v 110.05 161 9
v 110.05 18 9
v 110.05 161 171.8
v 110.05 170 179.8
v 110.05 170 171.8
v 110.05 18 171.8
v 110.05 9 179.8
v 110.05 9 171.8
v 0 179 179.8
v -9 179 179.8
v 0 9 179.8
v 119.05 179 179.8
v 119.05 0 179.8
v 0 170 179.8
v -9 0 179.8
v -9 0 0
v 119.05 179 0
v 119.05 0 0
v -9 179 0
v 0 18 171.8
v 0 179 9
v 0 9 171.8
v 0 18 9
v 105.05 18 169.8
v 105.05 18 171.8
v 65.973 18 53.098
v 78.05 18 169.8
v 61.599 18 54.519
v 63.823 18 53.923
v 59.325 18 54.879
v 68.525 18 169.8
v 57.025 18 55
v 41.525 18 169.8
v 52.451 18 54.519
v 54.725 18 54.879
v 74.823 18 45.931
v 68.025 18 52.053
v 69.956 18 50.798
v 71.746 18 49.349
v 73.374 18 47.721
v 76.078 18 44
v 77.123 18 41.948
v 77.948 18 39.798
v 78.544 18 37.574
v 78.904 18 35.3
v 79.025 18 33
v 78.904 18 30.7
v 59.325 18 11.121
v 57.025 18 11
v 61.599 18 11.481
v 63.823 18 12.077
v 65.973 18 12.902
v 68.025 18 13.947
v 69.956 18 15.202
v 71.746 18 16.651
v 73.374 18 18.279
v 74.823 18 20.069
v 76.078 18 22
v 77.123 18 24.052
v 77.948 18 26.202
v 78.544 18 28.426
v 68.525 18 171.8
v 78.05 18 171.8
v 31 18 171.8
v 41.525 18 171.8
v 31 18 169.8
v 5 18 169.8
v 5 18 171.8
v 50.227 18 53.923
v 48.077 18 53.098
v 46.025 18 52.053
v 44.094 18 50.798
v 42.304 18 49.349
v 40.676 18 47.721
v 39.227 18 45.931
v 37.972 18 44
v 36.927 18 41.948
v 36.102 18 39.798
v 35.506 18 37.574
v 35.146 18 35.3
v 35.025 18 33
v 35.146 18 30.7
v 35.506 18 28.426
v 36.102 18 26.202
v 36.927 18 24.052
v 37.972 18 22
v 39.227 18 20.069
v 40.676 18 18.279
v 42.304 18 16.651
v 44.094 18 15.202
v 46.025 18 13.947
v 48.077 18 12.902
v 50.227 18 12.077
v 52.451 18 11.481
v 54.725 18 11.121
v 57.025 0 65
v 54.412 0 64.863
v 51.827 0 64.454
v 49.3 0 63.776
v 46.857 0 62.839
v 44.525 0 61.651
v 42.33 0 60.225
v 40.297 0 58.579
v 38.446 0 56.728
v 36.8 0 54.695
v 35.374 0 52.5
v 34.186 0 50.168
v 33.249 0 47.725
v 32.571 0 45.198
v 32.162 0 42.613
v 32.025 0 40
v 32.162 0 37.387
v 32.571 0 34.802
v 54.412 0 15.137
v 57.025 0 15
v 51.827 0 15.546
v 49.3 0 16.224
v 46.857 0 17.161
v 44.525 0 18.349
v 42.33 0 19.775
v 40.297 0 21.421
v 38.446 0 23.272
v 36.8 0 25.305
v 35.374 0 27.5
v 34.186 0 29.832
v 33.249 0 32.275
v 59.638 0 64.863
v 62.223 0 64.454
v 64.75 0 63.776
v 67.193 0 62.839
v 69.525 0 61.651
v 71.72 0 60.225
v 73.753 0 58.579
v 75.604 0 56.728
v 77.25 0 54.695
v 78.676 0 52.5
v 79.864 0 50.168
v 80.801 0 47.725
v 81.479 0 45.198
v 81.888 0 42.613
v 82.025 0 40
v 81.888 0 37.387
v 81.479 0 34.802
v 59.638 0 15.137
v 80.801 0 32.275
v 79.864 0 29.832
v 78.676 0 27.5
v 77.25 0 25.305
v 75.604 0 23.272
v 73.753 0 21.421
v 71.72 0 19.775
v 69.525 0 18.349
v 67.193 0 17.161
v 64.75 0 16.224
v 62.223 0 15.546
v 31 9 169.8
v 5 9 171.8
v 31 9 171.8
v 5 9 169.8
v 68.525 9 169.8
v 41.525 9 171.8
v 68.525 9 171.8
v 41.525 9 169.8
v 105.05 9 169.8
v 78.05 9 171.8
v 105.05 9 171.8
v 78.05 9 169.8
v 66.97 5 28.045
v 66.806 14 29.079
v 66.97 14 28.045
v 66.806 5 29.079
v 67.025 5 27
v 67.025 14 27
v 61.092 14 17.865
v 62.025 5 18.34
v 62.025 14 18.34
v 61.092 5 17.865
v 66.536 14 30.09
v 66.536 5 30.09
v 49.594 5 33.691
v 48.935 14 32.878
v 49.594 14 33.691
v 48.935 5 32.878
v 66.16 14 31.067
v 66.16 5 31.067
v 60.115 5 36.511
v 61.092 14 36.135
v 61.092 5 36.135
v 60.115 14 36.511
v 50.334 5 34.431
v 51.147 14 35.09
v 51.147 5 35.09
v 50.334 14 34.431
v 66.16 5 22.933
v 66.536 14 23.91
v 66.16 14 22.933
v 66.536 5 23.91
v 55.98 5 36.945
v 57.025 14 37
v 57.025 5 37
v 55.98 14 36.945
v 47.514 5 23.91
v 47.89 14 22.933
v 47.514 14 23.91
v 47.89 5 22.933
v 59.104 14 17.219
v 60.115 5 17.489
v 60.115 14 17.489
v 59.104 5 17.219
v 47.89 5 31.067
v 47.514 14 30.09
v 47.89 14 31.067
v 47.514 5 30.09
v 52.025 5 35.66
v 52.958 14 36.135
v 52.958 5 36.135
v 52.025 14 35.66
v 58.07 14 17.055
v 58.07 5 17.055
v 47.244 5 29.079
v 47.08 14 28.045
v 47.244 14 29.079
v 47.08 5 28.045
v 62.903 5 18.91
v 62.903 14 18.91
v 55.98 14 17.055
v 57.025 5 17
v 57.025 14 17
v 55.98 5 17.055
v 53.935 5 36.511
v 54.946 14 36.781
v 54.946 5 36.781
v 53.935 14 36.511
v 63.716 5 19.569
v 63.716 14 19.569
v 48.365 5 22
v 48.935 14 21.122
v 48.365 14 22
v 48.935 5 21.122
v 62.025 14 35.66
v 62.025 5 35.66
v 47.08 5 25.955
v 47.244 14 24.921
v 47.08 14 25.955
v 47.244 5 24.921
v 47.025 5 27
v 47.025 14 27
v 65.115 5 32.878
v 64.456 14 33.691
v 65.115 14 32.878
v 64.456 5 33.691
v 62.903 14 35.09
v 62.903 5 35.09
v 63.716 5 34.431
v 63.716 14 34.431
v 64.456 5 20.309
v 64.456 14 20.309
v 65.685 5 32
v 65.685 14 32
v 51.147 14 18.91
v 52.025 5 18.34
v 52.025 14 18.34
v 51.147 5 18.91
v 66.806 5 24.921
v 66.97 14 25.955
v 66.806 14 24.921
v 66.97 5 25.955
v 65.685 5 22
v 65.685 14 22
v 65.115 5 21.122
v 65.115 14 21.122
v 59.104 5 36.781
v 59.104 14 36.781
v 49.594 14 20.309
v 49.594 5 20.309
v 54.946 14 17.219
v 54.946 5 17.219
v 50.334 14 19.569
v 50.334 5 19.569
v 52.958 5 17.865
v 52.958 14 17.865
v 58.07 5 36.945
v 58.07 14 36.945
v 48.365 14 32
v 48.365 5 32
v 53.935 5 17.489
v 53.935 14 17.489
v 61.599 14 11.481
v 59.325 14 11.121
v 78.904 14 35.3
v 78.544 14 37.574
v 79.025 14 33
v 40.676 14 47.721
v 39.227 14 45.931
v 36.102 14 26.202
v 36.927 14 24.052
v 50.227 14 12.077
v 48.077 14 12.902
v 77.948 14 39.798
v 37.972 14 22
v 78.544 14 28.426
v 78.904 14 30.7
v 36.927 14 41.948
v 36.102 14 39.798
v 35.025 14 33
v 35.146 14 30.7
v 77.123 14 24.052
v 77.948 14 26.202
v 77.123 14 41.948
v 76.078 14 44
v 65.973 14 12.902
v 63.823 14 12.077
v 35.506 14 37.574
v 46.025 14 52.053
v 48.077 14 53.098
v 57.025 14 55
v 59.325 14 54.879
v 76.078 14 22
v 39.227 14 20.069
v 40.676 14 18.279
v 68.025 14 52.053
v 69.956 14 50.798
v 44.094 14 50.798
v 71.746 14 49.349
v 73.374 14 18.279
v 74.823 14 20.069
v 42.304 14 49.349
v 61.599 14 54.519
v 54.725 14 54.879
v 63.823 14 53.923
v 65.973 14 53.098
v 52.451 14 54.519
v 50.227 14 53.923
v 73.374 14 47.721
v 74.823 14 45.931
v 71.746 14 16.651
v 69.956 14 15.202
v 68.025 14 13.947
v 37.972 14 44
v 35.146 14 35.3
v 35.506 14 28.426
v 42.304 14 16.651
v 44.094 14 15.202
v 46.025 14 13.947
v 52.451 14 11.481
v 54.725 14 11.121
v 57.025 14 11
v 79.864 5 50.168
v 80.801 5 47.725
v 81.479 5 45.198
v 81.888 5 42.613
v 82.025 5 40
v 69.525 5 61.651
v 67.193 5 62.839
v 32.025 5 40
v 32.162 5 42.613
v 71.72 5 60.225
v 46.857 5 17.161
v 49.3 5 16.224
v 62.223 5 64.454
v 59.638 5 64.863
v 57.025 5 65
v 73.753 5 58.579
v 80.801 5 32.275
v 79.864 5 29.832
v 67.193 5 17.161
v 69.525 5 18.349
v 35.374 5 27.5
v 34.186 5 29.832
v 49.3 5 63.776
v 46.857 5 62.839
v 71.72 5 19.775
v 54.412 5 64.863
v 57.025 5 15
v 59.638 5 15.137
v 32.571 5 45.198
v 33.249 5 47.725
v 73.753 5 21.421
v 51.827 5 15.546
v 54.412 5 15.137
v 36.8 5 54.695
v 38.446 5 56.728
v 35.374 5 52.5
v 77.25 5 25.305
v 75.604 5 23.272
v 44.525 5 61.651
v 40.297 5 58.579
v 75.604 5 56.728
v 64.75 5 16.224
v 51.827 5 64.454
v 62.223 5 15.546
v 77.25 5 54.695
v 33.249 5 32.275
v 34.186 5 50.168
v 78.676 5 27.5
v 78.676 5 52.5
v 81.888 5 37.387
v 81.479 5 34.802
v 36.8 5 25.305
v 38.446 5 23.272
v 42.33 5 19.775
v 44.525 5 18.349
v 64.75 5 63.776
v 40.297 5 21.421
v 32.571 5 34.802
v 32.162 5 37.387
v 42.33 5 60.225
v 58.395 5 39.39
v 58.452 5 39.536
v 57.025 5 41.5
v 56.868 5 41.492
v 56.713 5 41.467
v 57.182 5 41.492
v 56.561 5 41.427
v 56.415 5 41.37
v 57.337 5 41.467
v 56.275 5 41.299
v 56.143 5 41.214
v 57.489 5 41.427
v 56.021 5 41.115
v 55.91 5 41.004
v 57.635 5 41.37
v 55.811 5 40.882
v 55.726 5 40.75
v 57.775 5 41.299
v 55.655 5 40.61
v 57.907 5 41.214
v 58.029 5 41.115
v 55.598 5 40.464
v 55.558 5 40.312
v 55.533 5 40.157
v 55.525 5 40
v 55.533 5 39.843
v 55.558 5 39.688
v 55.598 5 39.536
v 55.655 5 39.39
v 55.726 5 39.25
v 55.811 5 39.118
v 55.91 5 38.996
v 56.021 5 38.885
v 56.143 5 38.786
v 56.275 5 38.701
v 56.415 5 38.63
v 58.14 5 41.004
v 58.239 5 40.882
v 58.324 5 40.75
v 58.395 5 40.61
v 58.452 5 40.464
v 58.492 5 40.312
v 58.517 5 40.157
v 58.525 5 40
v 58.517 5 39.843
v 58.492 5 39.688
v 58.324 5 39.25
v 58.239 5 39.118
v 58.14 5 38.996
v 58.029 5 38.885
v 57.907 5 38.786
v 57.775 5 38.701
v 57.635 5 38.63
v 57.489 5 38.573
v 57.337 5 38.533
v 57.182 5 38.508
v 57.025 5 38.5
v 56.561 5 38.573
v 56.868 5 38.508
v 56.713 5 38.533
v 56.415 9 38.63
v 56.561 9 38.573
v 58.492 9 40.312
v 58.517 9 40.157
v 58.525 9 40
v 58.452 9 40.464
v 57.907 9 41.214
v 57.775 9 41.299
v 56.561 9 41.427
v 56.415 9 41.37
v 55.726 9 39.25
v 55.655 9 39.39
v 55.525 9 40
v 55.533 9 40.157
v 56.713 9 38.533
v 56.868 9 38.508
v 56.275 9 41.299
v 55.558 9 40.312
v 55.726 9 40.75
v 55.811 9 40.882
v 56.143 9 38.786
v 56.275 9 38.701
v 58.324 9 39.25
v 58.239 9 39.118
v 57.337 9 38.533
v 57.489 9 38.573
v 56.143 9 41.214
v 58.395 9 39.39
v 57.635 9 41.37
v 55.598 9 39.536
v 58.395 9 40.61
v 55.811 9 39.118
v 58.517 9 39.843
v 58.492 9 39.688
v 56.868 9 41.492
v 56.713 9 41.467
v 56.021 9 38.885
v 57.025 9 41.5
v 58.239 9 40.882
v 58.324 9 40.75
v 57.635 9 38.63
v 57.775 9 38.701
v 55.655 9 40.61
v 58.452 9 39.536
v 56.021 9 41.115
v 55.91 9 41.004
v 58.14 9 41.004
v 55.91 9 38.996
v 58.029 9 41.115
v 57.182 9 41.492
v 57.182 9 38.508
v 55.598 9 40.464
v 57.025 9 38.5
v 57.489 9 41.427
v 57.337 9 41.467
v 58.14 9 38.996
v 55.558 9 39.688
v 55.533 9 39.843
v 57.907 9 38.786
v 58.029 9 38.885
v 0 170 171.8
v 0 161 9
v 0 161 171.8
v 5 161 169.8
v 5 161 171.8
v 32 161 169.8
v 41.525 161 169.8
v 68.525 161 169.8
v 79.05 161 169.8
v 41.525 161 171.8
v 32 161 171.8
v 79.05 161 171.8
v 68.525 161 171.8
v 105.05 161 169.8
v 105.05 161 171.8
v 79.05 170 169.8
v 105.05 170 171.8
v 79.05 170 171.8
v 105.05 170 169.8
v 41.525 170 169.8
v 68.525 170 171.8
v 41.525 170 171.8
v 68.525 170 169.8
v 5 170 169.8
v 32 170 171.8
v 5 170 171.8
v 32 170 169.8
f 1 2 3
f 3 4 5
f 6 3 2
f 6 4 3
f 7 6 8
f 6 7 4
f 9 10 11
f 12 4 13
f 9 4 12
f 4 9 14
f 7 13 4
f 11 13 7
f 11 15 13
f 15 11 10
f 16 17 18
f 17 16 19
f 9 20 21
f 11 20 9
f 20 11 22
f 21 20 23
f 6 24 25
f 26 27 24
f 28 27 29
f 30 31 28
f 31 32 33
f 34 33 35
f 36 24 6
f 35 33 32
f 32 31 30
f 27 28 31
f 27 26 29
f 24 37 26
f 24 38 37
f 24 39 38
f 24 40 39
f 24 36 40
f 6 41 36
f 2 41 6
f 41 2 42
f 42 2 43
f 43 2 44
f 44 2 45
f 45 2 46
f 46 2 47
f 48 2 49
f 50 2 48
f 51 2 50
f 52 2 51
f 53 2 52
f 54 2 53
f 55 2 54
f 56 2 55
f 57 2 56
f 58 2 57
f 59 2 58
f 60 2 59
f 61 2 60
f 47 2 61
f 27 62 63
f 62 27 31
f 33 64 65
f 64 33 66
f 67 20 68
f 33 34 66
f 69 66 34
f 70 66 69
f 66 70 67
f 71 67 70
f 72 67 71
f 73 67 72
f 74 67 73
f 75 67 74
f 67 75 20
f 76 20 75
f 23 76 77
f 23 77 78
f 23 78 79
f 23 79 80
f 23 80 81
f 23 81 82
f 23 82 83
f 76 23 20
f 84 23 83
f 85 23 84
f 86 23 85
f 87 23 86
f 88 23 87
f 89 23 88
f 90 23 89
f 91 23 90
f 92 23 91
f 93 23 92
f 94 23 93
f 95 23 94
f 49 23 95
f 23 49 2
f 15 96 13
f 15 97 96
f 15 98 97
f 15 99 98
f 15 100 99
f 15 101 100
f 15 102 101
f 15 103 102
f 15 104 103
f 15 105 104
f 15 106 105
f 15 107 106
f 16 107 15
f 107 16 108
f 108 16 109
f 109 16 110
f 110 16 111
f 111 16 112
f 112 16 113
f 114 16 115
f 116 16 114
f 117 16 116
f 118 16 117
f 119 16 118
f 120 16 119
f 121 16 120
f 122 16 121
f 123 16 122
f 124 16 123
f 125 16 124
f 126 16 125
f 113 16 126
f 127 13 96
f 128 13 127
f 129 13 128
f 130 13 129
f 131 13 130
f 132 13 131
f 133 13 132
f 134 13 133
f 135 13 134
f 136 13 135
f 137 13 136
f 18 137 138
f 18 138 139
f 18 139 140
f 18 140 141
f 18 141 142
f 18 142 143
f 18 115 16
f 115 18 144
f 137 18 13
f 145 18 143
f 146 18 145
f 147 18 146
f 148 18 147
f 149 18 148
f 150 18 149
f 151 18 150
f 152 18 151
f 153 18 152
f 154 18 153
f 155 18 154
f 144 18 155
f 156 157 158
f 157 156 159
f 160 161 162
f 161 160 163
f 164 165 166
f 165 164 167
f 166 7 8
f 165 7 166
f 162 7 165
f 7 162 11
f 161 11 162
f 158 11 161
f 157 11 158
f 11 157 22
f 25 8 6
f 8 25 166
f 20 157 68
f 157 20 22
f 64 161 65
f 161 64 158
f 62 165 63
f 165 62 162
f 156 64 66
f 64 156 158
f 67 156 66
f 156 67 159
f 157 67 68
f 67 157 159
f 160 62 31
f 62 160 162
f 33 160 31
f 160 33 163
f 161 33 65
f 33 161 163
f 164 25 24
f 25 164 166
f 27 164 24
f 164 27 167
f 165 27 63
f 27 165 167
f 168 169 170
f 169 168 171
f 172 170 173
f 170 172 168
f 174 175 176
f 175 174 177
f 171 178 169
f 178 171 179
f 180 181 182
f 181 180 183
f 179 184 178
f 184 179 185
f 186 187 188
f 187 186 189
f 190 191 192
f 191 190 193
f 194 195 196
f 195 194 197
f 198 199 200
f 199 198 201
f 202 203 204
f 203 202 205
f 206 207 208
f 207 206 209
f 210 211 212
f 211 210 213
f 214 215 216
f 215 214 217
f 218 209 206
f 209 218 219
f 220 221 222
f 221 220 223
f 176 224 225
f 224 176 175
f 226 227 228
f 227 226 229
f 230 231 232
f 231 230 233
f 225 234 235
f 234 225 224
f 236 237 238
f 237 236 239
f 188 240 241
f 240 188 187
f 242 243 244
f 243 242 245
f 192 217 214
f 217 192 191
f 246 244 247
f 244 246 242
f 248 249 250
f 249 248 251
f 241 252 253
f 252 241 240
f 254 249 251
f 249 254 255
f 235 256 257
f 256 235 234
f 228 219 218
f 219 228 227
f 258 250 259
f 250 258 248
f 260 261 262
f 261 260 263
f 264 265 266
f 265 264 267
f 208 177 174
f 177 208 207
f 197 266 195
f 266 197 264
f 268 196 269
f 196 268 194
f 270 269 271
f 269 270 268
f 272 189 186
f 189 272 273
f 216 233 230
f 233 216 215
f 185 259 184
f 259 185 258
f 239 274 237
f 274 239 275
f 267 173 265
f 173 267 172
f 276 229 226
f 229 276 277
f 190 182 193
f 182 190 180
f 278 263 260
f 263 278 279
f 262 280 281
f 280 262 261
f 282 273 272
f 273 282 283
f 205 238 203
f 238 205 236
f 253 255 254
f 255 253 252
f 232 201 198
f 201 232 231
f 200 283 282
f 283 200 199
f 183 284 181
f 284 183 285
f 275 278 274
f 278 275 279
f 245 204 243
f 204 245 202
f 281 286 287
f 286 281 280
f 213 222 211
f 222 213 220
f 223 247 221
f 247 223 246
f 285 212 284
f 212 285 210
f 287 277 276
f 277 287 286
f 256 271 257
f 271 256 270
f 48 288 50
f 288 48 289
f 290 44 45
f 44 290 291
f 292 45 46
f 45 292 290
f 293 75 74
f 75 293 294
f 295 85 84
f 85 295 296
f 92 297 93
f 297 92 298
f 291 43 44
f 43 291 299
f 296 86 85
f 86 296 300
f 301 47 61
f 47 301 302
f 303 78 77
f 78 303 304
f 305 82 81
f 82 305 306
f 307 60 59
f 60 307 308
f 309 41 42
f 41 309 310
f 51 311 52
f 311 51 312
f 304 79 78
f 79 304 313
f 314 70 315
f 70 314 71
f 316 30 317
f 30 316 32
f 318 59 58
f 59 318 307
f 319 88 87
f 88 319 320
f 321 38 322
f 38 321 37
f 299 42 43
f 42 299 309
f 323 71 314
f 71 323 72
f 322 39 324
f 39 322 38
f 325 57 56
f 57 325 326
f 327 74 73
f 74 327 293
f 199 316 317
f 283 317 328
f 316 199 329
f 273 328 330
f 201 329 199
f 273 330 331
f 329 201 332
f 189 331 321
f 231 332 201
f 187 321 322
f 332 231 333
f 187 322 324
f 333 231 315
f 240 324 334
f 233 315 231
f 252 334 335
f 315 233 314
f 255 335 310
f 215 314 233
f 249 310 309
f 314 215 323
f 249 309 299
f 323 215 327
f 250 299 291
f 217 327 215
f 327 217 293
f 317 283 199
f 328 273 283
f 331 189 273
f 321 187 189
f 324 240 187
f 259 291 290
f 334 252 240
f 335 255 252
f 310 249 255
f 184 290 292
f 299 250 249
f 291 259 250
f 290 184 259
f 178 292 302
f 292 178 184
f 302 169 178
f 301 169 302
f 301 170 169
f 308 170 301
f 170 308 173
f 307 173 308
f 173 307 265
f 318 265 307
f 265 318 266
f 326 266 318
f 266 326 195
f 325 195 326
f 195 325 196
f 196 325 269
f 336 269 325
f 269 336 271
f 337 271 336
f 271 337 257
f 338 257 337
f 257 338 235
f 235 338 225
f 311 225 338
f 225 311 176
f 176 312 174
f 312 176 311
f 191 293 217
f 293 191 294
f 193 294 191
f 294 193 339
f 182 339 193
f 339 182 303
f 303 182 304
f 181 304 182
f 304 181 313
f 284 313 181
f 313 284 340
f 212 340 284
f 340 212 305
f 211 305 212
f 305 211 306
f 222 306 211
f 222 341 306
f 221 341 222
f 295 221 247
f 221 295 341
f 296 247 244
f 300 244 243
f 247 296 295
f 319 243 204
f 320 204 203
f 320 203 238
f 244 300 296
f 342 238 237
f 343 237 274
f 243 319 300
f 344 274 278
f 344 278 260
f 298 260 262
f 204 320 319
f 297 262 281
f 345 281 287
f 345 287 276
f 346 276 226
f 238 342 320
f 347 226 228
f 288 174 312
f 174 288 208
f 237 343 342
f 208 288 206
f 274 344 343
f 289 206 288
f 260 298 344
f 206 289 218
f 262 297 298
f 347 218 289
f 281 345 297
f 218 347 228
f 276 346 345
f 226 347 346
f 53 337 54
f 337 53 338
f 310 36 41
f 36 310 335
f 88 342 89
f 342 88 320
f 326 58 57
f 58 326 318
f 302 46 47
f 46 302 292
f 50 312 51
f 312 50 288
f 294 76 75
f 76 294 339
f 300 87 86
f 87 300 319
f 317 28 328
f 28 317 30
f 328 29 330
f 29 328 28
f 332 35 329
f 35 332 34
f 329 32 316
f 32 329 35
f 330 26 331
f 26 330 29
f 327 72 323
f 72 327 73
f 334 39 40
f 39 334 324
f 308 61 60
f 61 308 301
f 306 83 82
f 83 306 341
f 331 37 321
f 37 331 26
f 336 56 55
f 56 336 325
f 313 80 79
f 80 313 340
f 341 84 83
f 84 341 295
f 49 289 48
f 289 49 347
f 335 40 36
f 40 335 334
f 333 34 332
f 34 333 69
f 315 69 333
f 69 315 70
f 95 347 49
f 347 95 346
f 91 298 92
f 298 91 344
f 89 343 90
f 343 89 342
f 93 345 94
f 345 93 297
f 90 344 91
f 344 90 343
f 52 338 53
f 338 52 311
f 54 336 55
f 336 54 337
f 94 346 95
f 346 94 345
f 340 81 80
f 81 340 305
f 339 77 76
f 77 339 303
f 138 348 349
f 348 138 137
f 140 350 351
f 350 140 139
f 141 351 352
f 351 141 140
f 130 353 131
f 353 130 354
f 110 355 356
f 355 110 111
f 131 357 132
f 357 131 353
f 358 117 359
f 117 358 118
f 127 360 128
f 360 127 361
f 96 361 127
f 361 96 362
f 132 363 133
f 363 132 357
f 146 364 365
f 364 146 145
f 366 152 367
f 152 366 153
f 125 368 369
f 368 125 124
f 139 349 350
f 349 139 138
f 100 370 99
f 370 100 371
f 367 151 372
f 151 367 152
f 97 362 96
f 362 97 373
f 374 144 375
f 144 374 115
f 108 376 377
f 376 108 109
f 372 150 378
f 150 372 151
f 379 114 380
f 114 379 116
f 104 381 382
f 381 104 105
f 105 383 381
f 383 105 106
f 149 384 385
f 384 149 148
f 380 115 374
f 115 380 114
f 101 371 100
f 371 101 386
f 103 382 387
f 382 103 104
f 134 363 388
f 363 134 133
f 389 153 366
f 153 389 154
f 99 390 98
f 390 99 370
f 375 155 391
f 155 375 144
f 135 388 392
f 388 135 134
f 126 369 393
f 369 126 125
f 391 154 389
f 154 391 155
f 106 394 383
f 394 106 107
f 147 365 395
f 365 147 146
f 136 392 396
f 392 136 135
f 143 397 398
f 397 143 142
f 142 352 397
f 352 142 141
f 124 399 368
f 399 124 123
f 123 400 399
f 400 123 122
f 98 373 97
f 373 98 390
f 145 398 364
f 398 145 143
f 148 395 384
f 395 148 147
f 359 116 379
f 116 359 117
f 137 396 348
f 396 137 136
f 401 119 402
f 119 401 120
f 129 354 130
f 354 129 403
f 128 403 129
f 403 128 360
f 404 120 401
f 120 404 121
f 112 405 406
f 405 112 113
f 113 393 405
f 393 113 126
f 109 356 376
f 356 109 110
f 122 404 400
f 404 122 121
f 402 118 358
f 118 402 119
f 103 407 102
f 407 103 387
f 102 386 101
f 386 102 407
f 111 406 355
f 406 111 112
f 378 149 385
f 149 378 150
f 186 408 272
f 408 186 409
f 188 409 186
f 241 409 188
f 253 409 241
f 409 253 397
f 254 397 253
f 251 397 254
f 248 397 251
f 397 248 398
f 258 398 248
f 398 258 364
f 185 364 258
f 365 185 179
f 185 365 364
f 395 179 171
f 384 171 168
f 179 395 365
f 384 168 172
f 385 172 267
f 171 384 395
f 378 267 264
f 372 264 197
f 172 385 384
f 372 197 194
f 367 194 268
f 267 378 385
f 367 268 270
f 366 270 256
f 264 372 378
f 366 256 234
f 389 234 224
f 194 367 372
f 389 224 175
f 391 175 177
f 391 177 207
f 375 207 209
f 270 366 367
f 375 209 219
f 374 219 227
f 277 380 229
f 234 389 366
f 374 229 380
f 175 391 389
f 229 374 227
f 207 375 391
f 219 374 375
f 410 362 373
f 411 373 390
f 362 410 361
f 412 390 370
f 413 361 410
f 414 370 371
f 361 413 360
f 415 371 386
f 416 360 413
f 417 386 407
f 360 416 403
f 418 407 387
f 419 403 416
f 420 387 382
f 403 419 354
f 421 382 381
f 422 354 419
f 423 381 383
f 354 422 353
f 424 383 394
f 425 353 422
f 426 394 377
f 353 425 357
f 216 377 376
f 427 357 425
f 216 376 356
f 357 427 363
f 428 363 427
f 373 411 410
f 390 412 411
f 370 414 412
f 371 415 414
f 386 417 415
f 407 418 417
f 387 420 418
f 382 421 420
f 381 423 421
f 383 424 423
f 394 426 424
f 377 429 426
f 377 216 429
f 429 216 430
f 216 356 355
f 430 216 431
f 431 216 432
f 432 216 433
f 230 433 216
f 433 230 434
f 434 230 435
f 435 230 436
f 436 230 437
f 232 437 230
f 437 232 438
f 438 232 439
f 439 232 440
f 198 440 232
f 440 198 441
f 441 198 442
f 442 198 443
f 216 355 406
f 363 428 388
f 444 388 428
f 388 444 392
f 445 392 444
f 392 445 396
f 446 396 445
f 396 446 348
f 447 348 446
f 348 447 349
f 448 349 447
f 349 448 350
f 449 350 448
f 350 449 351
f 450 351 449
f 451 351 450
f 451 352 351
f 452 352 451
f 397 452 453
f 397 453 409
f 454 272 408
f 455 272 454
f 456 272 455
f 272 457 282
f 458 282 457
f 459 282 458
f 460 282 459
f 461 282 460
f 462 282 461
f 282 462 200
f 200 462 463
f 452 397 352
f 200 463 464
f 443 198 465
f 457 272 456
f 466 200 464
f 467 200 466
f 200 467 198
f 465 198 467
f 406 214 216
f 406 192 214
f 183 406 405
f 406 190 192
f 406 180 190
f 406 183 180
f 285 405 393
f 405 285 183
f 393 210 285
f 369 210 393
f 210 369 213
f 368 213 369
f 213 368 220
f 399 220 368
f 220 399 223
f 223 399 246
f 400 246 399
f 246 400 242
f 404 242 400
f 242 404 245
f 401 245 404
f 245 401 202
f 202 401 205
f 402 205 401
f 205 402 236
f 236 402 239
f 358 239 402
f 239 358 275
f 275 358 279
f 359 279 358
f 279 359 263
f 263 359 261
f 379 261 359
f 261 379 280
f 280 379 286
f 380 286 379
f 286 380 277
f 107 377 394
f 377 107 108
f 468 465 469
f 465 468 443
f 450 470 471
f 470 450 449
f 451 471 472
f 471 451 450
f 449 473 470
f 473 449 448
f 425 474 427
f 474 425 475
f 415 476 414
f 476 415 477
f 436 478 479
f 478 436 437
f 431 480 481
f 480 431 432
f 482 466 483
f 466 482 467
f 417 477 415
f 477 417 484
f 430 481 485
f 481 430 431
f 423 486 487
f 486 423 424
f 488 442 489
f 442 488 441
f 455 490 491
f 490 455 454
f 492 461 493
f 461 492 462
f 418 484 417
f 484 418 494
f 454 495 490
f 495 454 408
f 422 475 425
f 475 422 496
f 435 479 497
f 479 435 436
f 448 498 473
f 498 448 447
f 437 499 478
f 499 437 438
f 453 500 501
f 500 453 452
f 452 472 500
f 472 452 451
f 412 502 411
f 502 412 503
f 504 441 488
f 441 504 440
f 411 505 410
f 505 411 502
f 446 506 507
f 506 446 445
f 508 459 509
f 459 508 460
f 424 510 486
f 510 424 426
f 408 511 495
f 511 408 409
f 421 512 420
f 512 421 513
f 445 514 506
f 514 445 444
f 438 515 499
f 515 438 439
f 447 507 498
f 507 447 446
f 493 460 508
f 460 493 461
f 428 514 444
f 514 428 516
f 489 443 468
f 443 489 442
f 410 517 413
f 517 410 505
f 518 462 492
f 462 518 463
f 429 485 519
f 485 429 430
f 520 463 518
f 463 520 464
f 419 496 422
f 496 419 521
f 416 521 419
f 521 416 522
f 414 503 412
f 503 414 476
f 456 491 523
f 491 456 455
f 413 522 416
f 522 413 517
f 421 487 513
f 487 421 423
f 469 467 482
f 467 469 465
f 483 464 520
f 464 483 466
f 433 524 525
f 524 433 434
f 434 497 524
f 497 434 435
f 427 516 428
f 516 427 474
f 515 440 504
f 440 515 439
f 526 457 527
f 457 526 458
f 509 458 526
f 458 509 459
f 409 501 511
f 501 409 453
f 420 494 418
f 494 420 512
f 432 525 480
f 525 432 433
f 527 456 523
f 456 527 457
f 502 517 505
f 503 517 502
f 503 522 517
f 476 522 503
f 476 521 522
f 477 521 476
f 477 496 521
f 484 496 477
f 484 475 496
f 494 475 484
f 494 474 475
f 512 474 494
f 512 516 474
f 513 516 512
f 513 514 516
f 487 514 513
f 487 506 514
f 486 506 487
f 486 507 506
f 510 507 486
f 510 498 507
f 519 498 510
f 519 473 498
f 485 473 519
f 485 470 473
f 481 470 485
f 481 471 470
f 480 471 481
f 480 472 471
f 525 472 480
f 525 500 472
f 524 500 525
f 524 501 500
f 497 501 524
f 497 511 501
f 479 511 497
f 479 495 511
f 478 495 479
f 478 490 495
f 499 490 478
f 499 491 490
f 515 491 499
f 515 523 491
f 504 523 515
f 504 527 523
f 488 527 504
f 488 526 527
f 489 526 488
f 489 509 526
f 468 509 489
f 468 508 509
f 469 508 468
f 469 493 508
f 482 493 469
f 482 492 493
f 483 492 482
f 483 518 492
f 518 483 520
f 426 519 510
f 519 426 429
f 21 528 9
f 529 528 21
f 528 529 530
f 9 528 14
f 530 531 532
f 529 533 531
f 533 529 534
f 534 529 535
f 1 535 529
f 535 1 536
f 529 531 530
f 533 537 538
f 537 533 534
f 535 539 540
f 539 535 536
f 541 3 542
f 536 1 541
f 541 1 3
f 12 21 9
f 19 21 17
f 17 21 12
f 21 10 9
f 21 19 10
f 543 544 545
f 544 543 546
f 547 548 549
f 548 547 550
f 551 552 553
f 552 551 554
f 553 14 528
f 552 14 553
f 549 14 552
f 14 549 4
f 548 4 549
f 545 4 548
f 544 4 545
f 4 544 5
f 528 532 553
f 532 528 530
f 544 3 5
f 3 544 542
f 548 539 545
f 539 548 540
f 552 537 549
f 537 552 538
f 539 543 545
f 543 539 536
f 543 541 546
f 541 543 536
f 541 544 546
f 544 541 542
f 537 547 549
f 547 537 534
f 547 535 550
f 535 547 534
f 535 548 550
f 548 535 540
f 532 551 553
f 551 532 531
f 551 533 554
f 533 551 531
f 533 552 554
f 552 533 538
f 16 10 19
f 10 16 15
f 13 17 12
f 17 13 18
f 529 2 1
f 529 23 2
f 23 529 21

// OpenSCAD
/*
Open 4 Frame Mating Nuc, 
released to the Public Domain by Robert Niles
*/


// these sizes are the best
// doesn't include each 9mm side
// the width allows the use of three frames which can be
// spanned together equaling one full standard langstroth frame
// so you can start them in a regular hive and/or move them
// from the nuc to a regular hive when finished.

width = 110.05; // x axis 
depth = 179; // y axis
framelength = depth-18; // y axis: minus 9mm from each side
echo(framelength=framelength);
height = 179.8; // z axis : 158.8 frame height + 6mm above + 6mm below + the 9mm bottom

// front wall
difference() {
    fb_wall(width,height);
    translate([(width/2)-25,0,8]) entrance_area();    
}    
// back wall
translate([width,depth,0]) rotate([180,180,0]) fb_wall(width,height);

// side 1
color("green") translate([-9,0,0]) cube([9,depth,height]);

// side 2
color("green") translate([width,0,0]) cube([9,depth,height]);


//bottom
cube([width,depth,9]);





module fb_wall(w=146.575,h=170.8){  
    difference() {
        // basic side
        cube([w,18,h]);
        
        // frame ledge
        translate([w,9,h-8]) rotate([0,0,90]) cube([9.525,w,16.1]);

        // frame divvets
        translate([5,9,h-10]) cube([26,9.525,14]);
        translate([5+27+9.525,9,h-10]) cube([27,9.525,14]);
        translate([5+27+9.525+27+9.525,9,h-10]) cube([27,9.525,14]);
        //translate([5+27+9.525+27+9.525+27+9.525,9,h-10]) cube([27,9.525,14]);   
    }
}


module entrance_area() {
        $fn=60;
        // create the entrance hole
        translate([27,20,19]) {
            rotate([90,0,0]) {
                color("green") {
                cylinder(h=21, r=10);
               }
            }
        }
        

        translate([27,35,25]) {
            rotate([90,0,0]) {
                color("blue") {
                cylinder(h=21, r=22);
               }
            }
        }
        
            
        // gate area
        translate([27,5,32]) {
            rotate([90,0,0]) {
                color("green") {
                cylinder(h=6, r=25);
               }
            }
        }
        
        // gate area screw hole
        translate([27,9,32]) {
            rotate([90,0,0]) {
                color("red") {
                cylinder(h=10, r=1.5);
               }
            }
        }        
}
